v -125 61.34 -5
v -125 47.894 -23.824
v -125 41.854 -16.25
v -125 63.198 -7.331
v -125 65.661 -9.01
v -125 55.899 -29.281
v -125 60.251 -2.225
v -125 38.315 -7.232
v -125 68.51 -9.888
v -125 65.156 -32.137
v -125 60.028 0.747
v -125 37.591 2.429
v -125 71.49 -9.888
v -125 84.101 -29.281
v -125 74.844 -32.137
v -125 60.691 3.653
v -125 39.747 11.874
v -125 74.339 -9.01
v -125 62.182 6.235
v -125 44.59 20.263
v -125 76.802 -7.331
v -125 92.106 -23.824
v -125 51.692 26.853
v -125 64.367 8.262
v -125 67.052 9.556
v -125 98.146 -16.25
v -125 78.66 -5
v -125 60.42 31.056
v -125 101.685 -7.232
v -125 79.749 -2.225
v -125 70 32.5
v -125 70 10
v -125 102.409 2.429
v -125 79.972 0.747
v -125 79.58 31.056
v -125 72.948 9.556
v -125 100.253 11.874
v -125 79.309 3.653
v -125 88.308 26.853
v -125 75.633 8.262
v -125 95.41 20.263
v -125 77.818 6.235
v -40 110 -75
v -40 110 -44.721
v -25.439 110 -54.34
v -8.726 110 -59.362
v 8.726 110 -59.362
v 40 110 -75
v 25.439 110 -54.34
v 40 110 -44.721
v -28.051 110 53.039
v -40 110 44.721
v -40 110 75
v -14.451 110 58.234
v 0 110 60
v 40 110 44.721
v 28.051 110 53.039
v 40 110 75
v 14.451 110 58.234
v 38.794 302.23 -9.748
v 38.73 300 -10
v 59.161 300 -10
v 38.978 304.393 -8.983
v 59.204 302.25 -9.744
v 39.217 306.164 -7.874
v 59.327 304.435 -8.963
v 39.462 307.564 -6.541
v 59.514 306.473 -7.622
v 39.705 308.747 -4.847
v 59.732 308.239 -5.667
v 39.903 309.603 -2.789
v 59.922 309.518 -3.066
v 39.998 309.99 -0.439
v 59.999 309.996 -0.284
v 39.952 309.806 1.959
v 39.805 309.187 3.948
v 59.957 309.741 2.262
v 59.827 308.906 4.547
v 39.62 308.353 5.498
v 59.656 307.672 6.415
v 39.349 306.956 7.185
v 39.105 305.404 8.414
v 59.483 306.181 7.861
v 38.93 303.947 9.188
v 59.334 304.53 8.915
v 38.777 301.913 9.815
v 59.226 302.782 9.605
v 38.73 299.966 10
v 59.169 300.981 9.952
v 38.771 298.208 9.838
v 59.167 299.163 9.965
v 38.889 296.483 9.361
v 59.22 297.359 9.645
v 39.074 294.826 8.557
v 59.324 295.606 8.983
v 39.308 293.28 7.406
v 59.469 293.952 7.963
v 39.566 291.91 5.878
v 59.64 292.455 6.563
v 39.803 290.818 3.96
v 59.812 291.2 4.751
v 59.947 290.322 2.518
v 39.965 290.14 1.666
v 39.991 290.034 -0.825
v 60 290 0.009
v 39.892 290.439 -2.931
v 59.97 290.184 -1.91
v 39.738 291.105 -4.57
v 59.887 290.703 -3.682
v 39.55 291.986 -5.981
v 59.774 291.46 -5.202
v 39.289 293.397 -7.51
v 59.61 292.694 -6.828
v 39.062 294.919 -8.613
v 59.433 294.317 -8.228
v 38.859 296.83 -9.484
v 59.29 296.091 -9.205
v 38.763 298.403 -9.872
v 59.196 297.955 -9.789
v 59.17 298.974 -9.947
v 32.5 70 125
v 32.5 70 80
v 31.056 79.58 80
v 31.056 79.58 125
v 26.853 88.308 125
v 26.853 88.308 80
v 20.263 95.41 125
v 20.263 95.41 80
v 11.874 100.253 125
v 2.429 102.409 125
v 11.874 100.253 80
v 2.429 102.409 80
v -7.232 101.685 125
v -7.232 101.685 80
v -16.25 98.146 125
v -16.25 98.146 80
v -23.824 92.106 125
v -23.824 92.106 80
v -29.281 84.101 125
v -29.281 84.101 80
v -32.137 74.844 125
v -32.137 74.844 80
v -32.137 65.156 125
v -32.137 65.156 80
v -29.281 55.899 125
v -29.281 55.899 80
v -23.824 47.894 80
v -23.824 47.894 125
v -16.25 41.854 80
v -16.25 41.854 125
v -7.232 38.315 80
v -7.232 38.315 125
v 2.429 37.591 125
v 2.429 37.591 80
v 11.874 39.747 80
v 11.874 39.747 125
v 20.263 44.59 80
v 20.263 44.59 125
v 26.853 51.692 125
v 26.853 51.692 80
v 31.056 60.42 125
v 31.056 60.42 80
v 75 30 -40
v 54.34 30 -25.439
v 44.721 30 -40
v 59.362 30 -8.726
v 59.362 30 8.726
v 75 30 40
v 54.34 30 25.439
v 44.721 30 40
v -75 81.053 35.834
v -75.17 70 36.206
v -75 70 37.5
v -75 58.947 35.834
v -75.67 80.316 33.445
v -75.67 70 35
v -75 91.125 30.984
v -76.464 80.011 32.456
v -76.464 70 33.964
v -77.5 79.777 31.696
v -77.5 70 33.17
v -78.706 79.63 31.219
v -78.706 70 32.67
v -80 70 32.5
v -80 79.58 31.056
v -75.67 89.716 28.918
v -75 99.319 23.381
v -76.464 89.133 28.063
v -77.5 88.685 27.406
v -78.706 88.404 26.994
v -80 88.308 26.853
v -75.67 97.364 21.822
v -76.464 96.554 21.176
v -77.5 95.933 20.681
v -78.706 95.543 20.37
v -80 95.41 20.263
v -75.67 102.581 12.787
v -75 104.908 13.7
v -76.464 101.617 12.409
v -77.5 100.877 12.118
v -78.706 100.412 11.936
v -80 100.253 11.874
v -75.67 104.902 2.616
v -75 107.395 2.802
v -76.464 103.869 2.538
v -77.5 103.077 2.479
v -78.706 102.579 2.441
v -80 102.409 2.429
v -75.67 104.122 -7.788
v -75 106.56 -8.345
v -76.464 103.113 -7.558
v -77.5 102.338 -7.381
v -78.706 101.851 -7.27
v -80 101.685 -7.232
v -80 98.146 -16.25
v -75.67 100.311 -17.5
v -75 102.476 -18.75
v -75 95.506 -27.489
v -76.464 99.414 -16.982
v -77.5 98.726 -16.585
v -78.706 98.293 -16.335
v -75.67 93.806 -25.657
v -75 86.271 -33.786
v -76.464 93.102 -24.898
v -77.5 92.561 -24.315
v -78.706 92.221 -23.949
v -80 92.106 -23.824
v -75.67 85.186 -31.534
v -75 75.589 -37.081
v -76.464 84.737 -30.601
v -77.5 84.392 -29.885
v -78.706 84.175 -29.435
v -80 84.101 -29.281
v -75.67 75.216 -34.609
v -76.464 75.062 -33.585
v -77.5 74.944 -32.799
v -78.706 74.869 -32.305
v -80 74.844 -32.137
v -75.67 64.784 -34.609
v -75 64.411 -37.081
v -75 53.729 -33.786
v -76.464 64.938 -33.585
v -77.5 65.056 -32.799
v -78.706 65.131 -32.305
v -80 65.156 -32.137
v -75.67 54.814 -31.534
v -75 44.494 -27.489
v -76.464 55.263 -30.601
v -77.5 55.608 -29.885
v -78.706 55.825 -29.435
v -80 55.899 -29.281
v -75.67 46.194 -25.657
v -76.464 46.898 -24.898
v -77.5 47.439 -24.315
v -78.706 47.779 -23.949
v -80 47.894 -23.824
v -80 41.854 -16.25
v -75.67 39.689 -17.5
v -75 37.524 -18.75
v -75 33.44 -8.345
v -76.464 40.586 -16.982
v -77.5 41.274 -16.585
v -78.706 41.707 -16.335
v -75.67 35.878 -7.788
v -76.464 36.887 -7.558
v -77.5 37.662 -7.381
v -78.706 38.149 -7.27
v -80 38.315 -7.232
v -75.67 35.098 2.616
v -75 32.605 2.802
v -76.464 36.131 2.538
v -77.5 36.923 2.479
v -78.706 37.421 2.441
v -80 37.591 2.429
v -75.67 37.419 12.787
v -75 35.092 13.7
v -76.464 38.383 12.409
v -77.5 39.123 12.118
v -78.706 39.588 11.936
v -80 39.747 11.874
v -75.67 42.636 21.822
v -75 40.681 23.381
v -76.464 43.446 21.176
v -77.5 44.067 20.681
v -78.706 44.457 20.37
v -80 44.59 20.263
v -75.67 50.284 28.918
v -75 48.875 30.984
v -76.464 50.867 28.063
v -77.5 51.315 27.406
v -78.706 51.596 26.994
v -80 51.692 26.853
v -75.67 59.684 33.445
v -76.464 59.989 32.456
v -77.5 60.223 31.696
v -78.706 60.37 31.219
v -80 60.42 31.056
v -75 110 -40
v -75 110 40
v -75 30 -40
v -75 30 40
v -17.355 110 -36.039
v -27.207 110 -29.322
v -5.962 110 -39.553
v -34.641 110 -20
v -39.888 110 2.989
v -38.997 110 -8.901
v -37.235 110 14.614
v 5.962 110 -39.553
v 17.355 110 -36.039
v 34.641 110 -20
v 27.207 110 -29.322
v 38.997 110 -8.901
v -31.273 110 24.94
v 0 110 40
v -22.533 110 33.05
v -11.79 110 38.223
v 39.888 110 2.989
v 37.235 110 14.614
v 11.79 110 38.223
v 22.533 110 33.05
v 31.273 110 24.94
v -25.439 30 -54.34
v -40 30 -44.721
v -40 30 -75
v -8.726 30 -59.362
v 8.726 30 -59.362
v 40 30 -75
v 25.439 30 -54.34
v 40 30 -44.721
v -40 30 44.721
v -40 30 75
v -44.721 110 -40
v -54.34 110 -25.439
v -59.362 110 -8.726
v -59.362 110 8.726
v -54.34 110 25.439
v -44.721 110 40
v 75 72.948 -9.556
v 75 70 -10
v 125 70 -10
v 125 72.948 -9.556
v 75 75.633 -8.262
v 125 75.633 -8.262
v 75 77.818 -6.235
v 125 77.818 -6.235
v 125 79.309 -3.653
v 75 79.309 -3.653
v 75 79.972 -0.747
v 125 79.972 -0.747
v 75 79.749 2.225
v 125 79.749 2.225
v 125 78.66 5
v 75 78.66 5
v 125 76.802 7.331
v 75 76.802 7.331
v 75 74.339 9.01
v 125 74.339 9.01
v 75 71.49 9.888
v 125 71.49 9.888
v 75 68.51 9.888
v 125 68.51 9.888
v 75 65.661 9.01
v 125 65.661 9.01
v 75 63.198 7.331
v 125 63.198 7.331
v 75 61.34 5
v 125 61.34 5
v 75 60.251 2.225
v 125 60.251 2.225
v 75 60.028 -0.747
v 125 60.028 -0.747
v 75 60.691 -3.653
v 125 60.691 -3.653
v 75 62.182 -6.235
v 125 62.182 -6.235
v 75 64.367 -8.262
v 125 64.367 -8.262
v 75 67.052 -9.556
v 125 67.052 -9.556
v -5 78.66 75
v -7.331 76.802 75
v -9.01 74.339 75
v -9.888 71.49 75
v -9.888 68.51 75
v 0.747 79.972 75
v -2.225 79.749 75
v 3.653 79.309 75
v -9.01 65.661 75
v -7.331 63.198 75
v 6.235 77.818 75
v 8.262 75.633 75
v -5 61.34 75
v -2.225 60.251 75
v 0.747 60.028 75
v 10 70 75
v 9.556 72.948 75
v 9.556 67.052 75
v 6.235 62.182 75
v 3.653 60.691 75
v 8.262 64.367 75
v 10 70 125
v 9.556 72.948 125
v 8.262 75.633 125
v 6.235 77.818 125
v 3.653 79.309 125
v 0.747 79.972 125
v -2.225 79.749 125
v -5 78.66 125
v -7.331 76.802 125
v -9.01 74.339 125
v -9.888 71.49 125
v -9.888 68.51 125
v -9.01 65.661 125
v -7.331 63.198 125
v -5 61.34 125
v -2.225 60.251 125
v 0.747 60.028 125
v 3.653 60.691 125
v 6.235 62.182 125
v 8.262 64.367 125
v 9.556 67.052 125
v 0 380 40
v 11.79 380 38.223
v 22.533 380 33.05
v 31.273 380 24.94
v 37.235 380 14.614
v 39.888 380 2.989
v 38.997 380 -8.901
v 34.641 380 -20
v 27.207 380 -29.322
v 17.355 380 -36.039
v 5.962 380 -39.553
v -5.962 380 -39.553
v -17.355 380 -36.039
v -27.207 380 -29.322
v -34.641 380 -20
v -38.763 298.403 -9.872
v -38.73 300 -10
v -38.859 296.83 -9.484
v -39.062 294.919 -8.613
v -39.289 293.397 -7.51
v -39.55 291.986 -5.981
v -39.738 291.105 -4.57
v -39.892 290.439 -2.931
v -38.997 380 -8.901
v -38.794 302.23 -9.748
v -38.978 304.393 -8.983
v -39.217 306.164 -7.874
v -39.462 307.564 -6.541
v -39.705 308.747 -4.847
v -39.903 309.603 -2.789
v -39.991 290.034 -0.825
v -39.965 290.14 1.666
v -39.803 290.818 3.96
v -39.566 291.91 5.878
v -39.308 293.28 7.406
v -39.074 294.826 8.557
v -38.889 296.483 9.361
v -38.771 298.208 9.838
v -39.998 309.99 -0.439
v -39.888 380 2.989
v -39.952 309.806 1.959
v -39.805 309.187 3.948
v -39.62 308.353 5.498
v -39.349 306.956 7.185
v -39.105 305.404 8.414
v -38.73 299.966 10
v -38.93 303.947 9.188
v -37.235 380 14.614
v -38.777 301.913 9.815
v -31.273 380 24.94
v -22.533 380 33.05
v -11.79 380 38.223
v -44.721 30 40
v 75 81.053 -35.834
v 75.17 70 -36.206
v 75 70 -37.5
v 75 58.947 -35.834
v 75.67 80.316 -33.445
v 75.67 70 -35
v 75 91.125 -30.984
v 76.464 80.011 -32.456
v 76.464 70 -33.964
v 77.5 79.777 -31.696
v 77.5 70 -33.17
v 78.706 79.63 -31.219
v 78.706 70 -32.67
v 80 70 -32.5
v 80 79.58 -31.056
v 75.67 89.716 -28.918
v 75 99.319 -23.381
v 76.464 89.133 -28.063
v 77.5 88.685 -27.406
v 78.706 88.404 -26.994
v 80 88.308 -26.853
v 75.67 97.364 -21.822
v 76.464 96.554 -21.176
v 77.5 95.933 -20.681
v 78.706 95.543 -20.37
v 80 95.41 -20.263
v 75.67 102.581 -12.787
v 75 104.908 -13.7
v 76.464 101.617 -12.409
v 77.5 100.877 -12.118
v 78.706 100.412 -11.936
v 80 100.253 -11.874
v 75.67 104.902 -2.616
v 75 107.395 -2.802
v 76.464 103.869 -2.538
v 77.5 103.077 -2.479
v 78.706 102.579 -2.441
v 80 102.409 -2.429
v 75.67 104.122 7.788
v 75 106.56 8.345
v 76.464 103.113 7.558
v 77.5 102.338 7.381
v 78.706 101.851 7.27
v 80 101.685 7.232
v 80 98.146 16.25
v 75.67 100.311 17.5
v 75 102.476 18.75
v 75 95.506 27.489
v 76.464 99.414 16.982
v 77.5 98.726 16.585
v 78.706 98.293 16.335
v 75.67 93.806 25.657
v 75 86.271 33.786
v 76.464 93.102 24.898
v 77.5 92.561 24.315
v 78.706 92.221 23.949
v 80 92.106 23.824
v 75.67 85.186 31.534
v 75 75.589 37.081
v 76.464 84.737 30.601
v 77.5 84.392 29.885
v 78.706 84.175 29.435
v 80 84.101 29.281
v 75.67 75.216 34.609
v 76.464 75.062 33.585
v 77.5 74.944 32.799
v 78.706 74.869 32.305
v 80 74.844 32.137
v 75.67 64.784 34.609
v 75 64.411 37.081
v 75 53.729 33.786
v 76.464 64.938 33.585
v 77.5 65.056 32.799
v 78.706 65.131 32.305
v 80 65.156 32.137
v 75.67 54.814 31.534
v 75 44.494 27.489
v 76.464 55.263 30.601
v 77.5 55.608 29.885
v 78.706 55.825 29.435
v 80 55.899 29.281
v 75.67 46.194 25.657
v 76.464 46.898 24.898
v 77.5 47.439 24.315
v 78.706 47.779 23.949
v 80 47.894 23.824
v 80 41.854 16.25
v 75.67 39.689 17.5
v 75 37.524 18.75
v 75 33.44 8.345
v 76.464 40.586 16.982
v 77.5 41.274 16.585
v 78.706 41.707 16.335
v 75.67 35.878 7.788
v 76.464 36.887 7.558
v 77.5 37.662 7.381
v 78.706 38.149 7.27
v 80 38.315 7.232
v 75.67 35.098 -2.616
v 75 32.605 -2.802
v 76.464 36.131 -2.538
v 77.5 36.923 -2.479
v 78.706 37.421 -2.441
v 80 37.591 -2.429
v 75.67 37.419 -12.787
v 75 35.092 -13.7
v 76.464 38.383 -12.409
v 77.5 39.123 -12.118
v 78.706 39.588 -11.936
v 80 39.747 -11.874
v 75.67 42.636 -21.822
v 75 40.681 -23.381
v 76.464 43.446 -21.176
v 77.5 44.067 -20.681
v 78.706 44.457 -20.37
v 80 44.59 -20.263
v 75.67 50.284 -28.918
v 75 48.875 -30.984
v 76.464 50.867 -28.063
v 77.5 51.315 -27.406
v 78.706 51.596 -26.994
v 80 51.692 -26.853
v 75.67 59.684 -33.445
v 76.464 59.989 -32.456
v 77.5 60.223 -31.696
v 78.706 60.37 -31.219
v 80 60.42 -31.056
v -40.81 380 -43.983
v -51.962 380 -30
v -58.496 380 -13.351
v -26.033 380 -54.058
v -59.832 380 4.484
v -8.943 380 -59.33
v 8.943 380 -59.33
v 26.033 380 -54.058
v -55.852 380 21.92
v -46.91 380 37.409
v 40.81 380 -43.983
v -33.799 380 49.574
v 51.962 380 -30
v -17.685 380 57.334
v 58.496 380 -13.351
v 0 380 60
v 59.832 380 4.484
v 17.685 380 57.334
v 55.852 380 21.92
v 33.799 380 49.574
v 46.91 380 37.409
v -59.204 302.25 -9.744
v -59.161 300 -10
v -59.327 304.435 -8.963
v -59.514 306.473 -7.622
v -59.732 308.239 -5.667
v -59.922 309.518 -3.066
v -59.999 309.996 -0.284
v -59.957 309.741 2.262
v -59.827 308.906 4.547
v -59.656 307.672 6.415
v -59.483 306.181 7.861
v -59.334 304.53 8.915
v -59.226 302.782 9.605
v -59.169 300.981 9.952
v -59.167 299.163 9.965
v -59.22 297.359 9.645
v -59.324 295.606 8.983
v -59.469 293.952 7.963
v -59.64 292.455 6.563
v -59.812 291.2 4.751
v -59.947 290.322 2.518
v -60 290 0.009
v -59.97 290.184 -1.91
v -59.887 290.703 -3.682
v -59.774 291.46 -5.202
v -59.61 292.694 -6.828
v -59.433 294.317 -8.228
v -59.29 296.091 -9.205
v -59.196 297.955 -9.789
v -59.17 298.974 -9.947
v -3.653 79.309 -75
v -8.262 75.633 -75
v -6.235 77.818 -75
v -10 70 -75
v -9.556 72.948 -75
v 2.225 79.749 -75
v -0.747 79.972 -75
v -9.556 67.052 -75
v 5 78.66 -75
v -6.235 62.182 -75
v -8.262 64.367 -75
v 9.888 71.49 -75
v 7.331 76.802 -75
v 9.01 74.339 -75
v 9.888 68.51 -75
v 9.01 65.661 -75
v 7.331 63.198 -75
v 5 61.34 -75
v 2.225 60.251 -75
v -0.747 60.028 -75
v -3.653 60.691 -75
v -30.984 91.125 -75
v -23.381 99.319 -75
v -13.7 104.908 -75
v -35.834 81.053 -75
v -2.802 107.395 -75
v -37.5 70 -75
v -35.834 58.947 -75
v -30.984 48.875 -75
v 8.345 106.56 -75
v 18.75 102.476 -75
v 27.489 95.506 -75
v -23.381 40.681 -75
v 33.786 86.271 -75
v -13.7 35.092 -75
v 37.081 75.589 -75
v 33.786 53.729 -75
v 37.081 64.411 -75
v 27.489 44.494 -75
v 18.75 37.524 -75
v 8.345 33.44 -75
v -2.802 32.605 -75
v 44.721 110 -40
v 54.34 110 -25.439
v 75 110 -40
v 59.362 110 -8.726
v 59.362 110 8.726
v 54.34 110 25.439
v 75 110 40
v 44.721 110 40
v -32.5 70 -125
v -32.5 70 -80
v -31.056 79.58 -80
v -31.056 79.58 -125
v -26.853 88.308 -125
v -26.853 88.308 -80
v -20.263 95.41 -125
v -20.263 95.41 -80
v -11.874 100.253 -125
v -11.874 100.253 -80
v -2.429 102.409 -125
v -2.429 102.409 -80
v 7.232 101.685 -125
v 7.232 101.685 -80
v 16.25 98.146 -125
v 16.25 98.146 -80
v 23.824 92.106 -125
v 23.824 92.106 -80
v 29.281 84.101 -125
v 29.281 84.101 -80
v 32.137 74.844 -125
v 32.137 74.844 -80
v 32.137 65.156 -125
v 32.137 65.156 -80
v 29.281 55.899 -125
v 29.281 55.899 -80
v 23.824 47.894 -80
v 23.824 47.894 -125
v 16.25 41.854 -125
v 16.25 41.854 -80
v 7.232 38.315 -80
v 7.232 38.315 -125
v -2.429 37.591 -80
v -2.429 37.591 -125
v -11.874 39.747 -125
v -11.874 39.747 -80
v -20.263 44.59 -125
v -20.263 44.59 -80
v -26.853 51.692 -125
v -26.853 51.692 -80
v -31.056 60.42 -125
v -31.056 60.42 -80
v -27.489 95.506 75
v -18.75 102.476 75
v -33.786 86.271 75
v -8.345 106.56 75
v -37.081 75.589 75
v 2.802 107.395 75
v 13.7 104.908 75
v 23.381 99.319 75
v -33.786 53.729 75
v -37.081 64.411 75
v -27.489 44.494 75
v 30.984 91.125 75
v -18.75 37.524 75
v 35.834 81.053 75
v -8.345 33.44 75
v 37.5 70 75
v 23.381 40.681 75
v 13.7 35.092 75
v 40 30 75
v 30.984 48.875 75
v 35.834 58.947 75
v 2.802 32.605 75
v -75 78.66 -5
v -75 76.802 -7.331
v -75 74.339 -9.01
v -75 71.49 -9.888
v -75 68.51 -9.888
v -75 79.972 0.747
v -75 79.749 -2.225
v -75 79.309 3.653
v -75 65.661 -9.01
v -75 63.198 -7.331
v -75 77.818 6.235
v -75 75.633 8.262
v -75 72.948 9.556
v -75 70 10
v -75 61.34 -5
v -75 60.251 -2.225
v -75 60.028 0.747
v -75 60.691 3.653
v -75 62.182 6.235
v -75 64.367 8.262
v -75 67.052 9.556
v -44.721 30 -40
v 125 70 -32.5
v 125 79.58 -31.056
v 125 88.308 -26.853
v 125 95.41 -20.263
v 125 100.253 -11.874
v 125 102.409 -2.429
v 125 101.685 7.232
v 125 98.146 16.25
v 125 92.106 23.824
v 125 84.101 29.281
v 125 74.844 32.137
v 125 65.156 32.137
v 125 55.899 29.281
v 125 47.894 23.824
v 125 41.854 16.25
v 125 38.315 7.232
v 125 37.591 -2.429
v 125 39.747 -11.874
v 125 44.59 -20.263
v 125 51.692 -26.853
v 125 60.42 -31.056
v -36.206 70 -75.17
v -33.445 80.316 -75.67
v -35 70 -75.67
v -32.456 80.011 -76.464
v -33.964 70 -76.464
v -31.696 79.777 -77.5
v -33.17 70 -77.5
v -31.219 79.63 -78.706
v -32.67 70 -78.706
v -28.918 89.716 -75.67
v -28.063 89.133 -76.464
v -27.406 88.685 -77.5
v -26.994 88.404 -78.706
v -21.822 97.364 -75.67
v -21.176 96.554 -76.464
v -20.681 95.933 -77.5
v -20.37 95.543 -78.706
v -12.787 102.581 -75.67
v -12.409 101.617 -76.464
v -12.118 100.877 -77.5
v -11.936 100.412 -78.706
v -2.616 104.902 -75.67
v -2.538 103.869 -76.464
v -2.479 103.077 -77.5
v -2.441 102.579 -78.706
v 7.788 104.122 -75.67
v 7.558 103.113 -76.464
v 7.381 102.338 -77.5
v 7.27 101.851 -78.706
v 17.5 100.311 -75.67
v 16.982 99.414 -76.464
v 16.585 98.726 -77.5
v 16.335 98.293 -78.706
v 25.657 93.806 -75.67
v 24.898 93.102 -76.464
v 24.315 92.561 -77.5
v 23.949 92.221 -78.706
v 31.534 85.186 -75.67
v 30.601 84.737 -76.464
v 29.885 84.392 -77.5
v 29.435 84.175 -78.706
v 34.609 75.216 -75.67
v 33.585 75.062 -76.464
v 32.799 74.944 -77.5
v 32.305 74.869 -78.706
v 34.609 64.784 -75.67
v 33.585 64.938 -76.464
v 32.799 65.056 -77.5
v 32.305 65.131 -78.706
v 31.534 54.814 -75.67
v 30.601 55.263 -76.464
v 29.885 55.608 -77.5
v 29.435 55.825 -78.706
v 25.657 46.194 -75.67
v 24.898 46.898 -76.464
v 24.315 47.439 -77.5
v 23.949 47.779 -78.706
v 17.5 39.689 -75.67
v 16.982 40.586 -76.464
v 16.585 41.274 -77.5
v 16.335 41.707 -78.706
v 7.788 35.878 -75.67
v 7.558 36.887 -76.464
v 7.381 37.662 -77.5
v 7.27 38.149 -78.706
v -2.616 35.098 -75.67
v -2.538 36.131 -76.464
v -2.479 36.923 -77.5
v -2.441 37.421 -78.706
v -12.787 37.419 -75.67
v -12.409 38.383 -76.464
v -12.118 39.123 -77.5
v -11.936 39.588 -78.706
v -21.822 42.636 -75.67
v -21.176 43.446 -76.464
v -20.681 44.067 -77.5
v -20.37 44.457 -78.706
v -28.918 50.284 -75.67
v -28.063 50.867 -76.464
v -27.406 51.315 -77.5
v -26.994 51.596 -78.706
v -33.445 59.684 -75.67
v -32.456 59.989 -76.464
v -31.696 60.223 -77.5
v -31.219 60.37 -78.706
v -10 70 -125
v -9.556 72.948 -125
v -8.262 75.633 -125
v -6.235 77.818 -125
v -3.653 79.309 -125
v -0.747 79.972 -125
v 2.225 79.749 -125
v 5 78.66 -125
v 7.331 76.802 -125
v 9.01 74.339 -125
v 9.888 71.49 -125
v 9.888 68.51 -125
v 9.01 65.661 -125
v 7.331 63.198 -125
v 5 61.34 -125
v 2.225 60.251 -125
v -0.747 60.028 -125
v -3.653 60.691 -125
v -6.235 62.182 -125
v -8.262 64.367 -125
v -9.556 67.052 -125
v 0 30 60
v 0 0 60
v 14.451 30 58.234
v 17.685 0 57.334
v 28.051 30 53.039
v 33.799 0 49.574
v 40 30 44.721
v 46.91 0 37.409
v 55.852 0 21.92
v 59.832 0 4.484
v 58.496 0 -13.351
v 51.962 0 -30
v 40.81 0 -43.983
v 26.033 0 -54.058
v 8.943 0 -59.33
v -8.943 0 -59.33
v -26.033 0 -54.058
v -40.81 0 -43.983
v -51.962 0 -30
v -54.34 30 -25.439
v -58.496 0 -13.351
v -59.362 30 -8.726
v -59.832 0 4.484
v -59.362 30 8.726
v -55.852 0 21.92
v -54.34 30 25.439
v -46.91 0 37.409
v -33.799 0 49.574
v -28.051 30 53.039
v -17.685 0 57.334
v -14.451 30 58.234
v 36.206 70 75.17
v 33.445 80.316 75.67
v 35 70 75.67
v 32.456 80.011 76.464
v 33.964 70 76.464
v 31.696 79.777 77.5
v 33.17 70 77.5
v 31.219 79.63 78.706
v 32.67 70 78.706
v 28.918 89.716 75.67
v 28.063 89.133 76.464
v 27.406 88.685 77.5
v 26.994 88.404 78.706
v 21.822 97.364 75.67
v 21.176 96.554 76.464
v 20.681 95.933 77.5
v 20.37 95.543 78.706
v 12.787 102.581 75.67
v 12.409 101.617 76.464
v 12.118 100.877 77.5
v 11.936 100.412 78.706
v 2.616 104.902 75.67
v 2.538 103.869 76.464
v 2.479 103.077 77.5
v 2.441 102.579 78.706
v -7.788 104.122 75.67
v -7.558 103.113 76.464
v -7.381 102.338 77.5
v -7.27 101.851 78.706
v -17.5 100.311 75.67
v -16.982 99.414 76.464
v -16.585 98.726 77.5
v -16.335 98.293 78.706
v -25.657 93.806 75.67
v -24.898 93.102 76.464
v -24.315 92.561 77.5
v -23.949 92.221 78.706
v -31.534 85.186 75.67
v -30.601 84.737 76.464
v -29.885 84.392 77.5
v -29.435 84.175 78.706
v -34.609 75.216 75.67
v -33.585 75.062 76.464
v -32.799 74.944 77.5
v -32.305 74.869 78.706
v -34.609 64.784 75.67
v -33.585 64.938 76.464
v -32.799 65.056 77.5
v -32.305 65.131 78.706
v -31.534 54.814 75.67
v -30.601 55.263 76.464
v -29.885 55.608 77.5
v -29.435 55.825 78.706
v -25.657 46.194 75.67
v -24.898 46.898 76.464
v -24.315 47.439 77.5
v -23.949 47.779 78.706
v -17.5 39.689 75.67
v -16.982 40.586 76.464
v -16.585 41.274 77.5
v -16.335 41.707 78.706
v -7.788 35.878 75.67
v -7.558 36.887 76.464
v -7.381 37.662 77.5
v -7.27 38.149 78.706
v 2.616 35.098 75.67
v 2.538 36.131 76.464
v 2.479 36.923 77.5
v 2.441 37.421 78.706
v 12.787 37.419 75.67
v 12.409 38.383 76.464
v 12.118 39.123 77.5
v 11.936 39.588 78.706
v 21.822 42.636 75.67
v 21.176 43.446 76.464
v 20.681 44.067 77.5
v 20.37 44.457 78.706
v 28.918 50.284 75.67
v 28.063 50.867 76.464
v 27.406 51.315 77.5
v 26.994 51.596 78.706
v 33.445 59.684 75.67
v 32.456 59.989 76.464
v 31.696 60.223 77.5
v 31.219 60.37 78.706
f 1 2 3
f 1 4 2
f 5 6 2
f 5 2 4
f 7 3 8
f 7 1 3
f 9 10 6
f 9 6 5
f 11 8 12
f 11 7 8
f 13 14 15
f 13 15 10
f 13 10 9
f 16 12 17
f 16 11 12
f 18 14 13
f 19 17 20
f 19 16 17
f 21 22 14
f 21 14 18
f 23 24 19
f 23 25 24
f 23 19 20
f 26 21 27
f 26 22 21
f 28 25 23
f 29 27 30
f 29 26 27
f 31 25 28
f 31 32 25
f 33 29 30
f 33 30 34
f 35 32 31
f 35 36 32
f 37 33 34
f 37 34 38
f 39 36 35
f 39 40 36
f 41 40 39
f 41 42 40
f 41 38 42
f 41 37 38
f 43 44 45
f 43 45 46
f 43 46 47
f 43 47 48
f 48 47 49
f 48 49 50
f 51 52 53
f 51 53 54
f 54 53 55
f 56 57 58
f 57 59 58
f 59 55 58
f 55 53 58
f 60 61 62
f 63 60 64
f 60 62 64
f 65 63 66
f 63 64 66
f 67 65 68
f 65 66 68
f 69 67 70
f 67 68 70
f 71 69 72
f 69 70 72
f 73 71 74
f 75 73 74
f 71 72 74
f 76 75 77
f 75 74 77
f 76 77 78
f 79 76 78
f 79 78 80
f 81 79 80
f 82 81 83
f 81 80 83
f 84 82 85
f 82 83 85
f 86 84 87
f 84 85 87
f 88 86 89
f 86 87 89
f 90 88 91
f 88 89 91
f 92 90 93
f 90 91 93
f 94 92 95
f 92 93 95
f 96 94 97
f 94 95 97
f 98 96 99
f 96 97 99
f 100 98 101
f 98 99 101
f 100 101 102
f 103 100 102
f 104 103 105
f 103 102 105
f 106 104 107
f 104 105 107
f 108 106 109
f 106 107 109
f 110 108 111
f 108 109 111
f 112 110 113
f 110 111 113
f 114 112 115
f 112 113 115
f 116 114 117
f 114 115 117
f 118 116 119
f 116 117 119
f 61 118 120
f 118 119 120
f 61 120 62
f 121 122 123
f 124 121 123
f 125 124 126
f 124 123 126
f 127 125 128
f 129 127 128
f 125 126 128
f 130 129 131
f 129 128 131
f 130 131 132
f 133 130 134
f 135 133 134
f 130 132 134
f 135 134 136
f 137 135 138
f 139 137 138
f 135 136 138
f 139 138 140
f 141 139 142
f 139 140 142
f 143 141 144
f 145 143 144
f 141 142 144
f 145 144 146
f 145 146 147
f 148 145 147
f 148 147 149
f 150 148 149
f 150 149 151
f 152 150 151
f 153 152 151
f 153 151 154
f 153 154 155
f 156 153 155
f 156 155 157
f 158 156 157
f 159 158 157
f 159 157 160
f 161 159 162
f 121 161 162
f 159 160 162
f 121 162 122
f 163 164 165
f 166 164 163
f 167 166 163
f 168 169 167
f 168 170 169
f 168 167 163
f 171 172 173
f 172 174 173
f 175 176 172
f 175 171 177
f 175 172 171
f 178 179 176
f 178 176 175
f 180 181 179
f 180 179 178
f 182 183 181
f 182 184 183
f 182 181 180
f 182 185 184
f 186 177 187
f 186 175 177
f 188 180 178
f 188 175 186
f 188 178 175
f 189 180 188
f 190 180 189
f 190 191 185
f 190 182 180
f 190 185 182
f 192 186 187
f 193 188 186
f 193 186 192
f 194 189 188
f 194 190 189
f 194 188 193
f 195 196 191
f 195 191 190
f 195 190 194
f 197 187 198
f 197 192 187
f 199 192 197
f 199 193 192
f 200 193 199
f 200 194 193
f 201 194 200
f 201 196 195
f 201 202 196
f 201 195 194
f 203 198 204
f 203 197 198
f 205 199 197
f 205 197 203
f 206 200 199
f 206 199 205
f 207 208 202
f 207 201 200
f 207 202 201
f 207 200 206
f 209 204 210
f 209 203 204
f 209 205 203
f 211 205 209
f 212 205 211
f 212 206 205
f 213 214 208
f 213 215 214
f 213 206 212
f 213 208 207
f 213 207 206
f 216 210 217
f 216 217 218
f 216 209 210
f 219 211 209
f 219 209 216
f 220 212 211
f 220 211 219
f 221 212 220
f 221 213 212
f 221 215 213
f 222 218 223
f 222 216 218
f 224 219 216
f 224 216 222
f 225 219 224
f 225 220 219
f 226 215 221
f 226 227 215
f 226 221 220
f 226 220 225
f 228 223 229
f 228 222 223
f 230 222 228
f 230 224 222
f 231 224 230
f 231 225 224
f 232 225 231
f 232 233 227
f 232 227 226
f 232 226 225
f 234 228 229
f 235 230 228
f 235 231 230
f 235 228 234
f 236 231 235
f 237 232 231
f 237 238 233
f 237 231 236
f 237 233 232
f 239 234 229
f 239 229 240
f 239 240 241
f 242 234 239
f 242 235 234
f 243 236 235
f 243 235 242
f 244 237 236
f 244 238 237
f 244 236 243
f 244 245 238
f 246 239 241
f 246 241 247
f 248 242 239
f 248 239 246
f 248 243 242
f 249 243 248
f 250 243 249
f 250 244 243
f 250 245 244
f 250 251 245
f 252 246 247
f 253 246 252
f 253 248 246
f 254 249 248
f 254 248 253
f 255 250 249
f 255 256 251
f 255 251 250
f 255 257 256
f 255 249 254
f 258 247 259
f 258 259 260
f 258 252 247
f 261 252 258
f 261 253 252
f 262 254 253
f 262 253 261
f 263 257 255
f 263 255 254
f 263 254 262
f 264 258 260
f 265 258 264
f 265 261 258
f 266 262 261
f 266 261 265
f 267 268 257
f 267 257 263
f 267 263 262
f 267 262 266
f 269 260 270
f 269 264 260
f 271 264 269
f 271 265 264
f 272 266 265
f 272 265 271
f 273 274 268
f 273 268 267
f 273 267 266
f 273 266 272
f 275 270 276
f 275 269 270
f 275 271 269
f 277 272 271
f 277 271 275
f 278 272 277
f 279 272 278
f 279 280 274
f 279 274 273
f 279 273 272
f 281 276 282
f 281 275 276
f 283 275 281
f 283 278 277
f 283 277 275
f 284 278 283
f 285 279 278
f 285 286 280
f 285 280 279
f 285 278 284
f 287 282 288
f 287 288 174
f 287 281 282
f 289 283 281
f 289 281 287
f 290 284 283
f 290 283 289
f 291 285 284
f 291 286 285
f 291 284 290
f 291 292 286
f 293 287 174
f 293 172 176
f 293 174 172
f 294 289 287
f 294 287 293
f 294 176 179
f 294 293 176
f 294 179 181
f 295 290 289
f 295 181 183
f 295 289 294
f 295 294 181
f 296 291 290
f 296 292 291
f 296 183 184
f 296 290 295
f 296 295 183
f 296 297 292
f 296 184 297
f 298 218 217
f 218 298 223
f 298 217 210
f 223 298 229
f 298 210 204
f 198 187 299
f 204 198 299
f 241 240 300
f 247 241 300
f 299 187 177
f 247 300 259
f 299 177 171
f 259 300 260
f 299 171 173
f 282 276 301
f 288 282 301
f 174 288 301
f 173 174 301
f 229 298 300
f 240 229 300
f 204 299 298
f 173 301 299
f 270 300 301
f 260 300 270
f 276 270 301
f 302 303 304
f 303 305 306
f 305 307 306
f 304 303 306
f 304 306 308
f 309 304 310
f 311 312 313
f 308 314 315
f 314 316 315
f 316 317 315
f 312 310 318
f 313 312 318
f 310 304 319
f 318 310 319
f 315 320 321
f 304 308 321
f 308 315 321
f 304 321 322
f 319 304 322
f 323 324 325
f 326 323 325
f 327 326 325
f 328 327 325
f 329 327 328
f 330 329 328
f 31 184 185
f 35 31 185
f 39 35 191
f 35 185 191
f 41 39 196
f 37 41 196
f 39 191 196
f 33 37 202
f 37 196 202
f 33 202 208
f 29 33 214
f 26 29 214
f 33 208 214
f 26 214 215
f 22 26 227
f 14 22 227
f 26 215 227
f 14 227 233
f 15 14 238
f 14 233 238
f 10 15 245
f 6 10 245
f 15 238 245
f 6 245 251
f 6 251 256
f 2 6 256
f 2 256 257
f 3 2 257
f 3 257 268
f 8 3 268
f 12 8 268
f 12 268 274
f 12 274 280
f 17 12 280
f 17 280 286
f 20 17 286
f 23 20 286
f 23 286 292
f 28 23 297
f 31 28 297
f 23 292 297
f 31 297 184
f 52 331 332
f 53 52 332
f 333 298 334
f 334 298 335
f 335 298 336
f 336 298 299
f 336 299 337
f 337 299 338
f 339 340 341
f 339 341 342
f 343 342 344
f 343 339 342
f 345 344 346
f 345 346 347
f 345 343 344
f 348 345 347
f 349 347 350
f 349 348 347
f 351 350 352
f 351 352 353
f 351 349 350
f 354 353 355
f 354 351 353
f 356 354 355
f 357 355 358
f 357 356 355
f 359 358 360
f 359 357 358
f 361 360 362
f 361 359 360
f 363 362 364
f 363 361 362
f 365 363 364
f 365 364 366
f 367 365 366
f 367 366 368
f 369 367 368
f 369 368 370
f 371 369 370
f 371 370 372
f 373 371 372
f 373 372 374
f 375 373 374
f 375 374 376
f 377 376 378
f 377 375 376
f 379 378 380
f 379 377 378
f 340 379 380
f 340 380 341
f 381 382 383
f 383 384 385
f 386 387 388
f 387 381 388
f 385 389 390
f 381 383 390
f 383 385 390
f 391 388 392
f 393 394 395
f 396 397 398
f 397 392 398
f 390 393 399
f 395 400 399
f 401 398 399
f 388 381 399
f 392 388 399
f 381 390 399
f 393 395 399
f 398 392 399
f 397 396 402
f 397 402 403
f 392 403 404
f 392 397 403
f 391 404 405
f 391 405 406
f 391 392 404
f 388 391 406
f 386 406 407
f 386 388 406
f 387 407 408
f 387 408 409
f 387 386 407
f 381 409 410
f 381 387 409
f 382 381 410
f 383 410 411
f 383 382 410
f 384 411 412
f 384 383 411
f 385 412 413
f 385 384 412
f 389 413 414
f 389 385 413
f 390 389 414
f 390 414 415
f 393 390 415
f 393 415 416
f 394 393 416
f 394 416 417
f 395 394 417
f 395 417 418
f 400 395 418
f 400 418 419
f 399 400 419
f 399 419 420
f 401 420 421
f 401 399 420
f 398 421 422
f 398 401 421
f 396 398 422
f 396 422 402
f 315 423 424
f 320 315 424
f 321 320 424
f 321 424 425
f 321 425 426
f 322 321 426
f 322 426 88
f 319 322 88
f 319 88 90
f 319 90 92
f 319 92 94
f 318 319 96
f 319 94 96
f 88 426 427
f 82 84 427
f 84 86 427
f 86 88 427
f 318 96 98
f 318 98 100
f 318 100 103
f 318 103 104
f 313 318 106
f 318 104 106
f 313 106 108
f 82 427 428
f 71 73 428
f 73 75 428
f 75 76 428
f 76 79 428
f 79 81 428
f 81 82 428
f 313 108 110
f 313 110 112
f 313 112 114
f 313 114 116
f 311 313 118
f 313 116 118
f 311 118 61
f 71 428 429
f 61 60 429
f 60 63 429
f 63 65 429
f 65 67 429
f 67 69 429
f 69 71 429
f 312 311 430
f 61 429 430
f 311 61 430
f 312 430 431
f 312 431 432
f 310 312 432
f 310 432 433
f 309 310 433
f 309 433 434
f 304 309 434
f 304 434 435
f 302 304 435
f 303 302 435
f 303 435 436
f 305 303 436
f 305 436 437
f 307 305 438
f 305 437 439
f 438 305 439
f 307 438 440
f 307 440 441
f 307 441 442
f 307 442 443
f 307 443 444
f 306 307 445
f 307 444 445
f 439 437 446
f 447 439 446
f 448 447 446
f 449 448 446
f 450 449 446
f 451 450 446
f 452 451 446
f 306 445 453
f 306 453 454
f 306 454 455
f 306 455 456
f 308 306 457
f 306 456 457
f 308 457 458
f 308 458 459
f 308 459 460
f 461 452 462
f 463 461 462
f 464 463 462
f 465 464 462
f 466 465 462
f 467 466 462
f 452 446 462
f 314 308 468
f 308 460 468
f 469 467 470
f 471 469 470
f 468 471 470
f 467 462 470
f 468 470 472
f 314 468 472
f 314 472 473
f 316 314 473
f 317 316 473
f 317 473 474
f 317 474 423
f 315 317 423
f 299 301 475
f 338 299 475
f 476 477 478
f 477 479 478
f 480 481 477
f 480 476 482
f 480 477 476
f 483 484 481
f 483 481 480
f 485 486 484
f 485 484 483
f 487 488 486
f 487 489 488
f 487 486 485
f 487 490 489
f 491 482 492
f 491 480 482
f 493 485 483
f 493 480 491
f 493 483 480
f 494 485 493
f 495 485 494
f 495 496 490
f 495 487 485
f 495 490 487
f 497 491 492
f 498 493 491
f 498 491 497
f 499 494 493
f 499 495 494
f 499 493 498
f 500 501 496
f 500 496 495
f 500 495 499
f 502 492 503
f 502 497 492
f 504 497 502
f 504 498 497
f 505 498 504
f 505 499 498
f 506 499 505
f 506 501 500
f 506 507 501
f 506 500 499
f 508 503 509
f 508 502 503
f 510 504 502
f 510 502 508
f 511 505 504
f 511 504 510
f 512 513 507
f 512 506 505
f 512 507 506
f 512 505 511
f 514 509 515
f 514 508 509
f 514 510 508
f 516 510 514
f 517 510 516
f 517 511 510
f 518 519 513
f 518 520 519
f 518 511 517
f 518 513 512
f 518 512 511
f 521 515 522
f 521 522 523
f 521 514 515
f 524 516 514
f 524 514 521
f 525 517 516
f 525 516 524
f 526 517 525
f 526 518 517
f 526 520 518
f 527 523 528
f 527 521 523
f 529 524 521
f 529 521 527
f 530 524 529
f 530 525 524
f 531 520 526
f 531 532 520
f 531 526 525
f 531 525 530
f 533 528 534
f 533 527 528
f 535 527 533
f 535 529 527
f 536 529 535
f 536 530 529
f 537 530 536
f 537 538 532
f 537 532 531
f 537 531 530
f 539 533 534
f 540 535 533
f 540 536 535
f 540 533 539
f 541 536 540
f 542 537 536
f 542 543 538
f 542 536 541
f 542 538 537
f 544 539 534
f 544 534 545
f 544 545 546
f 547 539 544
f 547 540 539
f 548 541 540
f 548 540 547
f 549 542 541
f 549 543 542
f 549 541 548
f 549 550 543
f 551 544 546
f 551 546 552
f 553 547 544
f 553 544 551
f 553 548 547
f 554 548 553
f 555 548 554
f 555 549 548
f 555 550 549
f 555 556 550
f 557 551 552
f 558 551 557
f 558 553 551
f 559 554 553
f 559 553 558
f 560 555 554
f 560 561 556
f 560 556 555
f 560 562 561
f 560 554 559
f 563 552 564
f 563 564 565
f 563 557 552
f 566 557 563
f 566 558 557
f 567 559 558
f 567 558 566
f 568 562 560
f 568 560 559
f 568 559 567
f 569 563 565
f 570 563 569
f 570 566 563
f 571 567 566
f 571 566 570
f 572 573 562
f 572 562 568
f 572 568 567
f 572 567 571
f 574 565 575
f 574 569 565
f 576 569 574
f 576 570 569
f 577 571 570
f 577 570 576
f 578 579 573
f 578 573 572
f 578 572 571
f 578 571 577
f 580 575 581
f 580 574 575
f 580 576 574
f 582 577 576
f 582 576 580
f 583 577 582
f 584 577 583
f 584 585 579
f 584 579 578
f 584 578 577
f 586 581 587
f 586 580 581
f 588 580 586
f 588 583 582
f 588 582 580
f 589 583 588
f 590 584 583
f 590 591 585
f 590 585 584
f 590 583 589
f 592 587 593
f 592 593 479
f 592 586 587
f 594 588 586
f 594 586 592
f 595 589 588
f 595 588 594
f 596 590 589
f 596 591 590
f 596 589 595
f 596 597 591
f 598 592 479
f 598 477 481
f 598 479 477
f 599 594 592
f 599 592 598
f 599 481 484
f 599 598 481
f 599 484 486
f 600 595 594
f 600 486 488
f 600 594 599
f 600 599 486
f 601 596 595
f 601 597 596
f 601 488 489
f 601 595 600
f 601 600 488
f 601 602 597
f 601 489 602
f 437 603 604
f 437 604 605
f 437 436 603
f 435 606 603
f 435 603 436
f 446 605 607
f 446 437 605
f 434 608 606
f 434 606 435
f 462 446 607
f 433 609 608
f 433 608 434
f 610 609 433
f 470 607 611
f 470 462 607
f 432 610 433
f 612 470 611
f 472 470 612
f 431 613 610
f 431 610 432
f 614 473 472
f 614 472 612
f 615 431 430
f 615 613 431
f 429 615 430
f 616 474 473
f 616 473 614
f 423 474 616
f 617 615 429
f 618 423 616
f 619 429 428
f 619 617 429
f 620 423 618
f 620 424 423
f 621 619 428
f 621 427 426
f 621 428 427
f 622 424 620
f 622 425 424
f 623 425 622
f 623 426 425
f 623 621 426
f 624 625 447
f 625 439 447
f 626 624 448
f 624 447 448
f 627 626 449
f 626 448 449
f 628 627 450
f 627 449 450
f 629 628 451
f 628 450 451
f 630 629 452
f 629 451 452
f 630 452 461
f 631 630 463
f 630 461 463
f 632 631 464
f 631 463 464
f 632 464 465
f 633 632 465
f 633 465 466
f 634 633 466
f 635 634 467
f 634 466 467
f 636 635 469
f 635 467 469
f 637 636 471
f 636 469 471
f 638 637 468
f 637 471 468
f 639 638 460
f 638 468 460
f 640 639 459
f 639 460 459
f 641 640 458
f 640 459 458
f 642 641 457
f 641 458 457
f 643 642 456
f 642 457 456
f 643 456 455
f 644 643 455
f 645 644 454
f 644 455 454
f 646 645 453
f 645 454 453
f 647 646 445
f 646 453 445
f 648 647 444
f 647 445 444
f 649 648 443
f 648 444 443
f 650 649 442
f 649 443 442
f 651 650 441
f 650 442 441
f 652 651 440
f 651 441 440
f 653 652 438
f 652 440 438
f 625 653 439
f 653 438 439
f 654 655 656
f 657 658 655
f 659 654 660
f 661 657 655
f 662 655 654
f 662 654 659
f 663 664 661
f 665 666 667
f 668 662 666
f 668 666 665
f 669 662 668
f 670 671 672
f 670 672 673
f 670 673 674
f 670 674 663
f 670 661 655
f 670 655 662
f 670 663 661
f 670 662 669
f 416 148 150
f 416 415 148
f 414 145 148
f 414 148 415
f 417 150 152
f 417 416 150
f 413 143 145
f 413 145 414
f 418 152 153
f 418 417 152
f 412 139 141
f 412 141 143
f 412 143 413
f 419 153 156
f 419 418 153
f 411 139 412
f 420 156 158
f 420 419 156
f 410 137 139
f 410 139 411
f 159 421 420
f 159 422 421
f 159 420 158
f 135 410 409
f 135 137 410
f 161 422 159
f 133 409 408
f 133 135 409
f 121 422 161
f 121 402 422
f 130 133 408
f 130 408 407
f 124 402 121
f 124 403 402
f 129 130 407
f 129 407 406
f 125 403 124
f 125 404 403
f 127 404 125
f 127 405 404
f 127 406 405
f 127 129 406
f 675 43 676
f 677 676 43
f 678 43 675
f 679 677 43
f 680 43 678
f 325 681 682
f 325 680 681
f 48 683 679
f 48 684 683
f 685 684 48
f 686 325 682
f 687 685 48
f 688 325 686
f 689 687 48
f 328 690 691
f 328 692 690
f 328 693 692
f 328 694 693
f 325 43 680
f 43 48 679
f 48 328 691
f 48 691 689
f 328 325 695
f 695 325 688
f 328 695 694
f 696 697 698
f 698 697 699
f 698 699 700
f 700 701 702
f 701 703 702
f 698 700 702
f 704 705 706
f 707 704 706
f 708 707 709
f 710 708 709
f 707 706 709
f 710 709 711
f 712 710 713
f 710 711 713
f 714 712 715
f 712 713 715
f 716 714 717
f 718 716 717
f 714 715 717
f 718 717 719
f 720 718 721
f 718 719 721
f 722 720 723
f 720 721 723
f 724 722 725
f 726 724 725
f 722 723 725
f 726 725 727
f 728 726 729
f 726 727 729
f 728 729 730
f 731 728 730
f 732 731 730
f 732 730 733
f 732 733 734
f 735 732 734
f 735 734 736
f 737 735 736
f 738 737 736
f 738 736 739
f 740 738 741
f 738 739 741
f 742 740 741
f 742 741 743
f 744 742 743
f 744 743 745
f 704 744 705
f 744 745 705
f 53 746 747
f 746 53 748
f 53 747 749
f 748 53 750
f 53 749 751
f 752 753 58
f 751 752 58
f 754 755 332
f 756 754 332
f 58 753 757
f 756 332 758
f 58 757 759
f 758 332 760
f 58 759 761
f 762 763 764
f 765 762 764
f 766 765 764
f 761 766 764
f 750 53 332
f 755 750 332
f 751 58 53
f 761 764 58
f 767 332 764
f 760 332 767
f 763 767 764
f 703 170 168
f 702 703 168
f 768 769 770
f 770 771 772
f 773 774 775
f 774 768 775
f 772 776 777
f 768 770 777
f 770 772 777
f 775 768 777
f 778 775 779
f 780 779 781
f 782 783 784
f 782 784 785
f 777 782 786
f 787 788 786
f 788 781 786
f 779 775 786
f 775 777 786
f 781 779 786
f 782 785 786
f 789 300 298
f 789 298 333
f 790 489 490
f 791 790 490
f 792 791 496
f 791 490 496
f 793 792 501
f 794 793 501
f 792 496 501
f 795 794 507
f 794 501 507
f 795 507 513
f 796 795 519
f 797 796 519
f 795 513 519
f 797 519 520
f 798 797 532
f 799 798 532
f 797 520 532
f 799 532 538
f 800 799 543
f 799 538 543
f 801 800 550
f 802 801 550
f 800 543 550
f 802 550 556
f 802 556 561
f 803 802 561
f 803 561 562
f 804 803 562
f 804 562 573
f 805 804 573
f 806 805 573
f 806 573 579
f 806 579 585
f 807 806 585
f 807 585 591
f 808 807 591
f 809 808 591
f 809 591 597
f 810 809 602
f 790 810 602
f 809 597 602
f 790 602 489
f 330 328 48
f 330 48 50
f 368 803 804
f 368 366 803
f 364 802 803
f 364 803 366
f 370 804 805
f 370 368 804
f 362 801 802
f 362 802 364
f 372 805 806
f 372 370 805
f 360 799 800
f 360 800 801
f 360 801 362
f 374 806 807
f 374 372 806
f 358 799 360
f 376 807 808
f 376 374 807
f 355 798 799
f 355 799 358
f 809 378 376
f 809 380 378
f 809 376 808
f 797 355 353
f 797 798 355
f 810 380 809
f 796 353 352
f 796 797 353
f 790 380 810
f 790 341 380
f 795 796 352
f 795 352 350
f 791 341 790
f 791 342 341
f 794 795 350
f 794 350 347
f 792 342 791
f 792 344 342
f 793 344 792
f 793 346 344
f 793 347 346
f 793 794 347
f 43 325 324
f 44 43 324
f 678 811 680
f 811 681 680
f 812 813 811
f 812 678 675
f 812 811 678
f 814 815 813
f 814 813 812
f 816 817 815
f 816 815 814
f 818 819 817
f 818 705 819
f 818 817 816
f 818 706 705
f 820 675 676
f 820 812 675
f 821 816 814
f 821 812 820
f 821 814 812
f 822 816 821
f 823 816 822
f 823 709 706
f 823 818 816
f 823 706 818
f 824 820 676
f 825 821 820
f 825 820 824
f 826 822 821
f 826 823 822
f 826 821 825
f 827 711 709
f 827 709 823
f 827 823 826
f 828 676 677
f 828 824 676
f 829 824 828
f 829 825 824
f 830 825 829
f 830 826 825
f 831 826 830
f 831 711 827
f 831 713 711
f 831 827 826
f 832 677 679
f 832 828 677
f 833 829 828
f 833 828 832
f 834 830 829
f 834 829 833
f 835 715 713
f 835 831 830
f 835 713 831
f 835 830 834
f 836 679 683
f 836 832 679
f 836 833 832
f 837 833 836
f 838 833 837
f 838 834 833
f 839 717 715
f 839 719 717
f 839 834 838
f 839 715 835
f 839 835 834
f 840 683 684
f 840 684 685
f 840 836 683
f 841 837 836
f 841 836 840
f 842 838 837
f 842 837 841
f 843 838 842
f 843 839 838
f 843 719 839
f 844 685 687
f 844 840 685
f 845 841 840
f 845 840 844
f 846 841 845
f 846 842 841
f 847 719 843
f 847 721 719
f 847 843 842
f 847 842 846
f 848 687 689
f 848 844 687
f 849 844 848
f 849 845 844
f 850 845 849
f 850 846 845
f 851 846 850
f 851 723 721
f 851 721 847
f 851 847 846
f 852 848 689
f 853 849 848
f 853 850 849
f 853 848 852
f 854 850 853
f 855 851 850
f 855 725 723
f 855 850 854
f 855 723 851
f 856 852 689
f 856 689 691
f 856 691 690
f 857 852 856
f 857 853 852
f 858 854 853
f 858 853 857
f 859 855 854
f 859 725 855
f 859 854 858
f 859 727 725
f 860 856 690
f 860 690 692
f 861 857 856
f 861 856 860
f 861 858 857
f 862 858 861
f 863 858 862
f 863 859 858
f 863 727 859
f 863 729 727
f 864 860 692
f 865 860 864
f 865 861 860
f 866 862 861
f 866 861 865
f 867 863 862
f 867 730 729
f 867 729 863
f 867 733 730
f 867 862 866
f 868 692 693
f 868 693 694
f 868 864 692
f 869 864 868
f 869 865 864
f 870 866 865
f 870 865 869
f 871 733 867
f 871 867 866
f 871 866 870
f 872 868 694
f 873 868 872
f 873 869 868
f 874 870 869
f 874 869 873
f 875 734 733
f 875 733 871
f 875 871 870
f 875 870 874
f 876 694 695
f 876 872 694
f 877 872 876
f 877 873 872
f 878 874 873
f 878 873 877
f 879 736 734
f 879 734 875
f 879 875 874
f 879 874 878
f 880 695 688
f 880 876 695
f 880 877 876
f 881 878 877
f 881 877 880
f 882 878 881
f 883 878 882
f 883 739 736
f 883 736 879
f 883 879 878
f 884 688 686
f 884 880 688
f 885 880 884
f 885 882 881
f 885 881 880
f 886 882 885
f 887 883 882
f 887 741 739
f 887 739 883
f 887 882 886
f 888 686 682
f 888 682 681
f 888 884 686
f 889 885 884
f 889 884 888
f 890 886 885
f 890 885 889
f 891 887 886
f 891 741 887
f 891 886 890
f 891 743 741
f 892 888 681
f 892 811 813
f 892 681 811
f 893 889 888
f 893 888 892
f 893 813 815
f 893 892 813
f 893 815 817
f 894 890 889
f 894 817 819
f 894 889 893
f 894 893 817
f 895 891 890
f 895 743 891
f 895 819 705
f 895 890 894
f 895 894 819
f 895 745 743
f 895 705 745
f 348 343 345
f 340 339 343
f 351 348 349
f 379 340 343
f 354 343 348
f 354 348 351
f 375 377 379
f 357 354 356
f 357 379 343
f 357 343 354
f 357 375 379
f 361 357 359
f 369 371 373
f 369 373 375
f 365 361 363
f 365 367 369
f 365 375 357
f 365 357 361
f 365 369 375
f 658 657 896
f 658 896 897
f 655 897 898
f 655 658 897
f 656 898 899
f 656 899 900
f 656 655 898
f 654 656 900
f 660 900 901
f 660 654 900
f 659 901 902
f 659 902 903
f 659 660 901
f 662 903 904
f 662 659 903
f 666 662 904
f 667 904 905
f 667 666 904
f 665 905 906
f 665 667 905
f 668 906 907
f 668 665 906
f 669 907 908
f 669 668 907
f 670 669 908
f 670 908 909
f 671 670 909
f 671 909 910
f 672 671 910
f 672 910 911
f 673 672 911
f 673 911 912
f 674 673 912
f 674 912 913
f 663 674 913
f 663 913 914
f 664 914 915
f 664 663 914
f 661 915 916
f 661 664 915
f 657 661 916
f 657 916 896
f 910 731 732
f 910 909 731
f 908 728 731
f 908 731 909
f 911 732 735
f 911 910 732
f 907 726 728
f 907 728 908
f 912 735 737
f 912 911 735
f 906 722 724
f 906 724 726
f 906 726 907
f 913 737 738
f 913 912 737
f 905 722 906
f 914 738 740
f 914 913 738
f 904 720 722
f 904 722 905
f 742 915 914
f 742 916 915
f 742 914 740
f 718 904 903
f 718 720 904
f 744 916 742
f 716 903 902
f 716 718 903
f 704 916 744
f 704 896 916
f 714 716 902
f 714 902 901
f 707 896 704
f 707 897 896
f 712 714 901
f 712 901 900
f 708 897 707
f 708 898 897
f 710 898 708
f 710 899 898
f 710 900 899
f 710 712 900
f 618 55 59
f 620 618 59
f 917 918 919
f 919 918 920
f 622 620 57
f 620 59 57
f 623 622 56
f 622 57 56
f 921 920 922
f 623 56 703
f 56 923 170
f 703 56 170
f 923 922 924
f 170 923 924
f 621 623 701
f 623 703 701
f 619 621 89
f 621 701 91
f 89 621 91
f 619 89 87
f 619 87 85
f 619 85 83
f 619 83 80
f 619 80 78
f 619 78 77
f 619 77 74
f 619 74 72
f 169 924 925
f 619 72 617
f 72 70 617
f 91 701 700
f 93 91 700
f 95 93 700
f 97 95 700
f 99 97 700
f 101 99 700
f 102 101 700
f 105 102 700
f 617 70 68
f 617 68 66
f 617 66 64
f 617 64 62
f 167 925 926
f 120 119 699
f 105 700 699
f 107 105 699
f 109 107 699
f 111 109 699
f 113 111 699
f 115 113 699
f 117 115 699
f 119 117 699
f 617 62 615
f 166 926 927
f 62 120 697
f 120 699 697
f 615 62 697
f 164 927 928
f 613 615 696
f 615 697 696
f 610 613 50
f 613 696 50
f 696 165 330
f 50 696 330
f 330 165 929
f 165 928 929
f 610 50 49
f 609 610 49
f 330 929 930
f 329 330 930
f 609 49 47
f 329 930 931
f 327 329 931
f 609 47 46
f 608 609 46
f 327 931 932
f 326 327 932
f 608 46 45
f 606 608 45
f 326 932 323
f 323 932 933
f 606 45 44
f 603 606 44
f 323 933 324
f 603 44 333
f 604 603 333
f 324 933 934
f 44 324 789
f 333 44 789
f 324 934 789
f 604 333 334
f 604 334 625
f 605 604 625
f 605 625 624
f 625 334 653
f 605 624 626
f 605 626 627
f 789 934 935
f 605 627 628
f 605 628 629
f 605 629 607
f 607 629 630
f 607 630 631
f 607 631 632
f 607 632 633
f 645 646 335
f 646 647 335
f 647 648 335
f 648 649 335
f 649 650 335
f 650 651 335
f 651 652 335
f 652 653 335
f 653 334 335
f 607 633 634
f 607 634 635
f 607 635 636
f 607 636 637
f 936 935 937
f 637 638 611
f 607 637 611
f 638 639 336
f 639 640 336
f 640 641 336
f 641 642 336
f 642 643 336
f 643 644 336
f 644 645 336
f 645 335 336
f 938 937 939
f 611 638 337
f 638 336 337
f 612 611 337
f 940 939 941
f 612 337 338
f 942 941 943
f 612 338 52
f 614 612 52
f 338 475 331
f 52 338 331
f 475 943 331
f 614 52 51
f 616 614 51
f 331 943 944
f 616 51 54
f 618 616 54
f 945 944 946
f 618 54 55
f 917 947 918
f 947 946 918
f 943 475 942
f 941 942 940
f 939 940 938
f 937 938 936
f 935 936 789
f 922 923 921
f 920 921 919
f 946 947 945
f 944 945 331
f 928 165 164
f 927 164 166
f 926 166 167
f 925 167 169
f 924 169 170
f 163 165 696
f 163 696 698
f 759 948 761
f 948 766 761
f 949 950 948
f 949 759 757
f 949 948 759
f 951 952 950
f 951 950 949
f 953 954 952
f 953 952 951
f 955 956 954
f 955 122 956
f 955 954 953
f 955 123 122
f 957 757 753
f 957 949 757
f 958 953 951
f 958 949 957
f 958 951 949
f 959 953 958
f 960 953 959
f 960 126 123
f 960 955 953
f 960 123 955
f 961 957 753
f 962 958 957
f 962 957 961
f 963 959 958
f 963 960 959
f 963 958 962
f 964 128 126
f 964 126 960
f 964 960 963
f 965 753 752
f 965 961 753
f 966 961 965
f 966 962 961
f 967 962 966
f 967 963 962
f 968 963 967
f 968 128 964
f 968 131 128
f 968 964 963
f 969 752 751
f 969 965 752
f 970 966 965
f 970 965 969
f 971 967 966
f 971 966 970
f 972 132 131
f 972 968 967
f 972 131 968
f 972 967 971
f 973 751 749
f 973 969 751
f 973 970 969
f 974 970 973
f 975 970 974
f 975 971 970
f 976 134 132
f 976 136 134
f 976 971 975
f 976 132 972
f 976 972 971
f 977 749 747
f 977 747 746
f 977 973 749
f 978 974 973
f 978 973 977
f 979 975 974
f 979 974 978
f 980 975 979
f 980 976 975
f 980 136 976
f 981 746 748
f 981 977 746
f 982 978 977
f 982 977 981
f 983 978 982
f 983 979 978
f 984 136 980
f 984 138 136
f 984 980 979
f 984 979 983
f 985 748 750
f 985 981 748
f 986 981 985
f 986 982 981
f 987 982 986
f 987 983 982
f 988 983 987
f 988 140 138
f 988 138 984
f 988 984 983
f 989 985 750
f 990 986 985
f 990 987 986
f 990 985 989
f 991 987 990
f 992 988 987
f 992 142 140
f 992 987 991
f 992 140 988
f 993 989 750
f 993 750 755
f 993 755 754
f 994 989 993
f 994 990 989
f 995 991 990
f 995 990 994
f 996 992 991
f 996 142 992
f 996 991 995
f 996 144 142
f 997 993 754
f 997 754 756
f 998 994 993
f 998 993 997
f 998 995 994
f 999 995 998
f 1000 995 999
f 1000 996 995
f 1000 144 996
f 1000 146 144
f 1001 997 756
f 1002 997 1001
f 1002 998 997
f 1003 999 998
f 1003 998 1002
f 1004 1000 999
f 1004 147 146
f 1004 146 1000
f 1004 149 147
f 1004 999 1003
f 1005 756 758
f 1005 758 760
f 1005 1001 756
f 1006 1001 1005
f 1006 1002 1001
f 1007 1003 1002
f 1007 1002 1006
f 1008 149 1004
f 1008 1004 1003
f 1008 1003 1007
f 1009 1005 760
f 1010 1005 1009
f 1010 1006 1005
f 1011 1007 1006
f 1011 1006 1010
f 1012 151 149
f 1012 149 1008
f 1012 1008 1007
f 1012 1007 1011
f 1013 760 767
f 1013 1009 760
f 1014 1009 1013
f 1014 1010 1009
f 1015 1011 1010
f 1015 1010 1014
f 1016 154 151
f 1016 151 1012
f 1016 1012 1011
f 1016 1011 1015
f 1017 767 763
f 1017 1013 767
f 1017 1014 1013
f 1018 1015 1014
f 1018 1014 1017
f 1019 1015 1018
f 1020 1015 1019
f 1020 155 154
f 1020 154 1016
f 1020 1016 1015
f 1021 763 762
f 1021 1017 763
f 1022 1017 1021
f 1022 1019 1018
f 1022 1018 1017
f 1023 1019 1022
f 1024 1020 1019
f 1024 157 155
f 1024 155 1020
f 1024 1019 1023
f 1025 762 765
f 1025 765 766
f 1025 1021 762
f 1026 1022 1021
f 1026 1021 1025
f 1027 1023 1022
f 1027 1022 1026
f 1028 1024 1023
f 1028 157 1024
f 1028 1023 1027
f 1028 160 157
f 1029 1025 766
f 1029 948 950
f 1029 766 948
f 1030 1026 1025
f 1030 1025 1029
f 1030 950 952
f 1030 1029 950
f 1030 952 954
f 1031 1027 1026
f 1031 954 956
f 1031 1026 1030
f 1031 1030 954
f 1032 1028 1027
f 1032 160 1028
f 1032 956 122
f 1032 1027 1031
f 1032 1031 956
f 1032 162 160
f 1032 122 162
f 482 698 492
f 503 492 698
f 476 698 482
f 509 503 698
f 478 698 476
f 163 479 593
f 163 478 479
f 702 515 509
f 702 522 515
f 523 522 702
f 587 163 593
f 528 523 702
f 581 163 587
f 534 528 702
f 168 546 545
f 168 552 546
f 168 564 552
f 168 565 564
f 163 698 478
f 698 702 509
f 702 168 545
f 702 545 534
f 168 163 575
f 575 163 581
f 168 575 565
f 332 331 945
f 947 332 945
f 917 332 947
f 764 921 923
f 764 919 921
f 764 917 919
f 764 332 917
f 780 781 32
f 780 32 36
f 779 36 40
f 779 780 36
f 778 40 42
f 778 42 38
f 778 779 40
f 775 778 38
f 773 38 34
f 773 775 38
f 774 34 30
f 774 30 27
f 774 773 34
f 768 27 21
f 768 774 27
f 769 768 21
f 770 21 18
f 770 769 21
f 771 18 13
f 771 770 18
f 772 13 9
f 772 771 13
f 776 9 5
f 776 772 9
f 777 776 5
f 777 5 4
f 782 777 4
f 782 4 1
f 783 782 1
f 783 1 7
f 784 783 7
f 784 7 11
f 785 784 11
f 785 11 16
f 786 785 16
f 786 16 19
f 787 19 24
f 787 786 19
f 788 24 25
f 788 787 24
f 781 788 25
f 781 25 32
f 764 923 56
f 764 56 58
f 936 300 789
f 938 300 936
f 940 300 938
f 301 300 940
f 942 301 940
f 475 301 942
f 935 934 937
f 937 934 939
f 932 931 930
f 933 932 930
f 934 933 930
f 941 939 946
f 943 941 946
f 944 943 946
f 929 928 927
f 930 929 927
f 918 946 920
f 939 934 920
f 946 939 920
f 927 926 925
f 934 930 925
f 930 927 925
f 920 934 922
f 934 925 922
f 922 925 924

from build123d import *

# Parameters (mm, degrees)
SKETCH1_R           = 60
BOSS_EXTRUDE1_DEPTH = 380
SKETCH2_R           = 40
CUT_EXTRUDE1_DEPTH  = 300
SKETCH3_R           = 10
CUT_EXTRUDE2_DEPTH  = 150
BOSS_EXTRUDE2_START = -30
SKETCH4_W           = 150
SKETCH4_H           = 80
SKETCH4_W_2         = 80
SKETCH4_H_2         = 150
BOSS_EXTRUDE2_DEPTH = 80
SKETCH5_R           = 32.5
SKETCH5_R_2         = 10
BOSS_EXTRUDE3_DEPTH = 50
FILLET1_R           = 5
CIRPATTERN2_COUNT   = 4
FILLET2_R           = 5


with BuildPart() as part:
    # Sketch1 → Boss-Extrude1 (new body)
    with BuildSketch(Plane(origin=(0, 0, 0), x_dir=(1, 0, 0), z_dir=(0, 1, 0))):
        with Locations(Location((0, 0, 0), (0, 0, 270))):
            Circle(SKETCH1_R)
    extrude(amount=BOSS_EXTRUDE1_DEPTH)

    # Sketch2 → Cut-Extrude1 (cut)
    with BuildSketch(Plane(origin=(0, 380, 0), x_dir=(1, 0, 0), z_dir=(0, 1, 0))):
        with Locations(Location((0, 0, 0), (0, 0, 270))):
            Circle(SKETCH2_R)
    extrude(amount=-CUT_EXTRUDE1_DEPTH, mode=Mode.SUBTRACT)

    # Sketch3 → Cut-Extrude2 (cut, symmetric)
    with BuildSketch(Plane(origin=(0, 0, 0), x_dir=(0, 0, -1), z_dir=(1, 0, 0))):
        with Locations((0, 300)):
            Circle(SKETCH3_R)
    extrude(amount=CUT_EXTRUDE2_DEPTH, both=True, mode=Mode.SUBTRACT)

    # Sketch4 → Boss-Extrude2 (add)
    with BuildSketch(Plane.XZ.offset(BOSS_EXTRUDE2_START)):
        Rectangle(SKETCH4_W, SKETCH4_H)
        Rectangle(SKETCH4_W_2, SKETCH4_H_2)
    extrude(amount=-BOSS_EXTRUDE2_DEPTH)

    # Sketch5 → Boss-Extrude3 (add)
    with BuildSketch(Plane.ZY.offset(75)):
        with Locations((0, 70)):
            Circle(SKETCH5_R)
        with Locations((0, 70)):
            Circle(SKETCH5_R_2, mode=Mode.SUBTRACT)
    boss_extrude3 = extrude(amount=BOSS_EXTRUDE3_DEPTH)

    # Fillet1
    fillet1_edges = [part.edges().sort_by_distance(p)[0] for p in [
        (-75, 70, -32.5),
    ]]
    fillet(fillet1_edges, radius=FILLET1_R)

    # CirPattern2: Boss-Extrude3 ×4 about axis
    cirpattern2_axis = Axis((0, 0, 0), (0, 1, 0))
    for i in range(1, CIRPATTERN2_COUNT):
        add(boss_extrude3.rotate(cirpattern2_axis, i * 360 / CIRPATTERN2_COUNT))

    # Fillet2
    fillet2_edges = [part.edges().sort_by_distance(p)[0] for p in [
        (-32.5, 70, 75),
        (75, 70, 32.5),
        (32.5, 70, -75),
    ]]
    fillet(fillet2_edges, radius=FILLET2_R)


solid = part.part
